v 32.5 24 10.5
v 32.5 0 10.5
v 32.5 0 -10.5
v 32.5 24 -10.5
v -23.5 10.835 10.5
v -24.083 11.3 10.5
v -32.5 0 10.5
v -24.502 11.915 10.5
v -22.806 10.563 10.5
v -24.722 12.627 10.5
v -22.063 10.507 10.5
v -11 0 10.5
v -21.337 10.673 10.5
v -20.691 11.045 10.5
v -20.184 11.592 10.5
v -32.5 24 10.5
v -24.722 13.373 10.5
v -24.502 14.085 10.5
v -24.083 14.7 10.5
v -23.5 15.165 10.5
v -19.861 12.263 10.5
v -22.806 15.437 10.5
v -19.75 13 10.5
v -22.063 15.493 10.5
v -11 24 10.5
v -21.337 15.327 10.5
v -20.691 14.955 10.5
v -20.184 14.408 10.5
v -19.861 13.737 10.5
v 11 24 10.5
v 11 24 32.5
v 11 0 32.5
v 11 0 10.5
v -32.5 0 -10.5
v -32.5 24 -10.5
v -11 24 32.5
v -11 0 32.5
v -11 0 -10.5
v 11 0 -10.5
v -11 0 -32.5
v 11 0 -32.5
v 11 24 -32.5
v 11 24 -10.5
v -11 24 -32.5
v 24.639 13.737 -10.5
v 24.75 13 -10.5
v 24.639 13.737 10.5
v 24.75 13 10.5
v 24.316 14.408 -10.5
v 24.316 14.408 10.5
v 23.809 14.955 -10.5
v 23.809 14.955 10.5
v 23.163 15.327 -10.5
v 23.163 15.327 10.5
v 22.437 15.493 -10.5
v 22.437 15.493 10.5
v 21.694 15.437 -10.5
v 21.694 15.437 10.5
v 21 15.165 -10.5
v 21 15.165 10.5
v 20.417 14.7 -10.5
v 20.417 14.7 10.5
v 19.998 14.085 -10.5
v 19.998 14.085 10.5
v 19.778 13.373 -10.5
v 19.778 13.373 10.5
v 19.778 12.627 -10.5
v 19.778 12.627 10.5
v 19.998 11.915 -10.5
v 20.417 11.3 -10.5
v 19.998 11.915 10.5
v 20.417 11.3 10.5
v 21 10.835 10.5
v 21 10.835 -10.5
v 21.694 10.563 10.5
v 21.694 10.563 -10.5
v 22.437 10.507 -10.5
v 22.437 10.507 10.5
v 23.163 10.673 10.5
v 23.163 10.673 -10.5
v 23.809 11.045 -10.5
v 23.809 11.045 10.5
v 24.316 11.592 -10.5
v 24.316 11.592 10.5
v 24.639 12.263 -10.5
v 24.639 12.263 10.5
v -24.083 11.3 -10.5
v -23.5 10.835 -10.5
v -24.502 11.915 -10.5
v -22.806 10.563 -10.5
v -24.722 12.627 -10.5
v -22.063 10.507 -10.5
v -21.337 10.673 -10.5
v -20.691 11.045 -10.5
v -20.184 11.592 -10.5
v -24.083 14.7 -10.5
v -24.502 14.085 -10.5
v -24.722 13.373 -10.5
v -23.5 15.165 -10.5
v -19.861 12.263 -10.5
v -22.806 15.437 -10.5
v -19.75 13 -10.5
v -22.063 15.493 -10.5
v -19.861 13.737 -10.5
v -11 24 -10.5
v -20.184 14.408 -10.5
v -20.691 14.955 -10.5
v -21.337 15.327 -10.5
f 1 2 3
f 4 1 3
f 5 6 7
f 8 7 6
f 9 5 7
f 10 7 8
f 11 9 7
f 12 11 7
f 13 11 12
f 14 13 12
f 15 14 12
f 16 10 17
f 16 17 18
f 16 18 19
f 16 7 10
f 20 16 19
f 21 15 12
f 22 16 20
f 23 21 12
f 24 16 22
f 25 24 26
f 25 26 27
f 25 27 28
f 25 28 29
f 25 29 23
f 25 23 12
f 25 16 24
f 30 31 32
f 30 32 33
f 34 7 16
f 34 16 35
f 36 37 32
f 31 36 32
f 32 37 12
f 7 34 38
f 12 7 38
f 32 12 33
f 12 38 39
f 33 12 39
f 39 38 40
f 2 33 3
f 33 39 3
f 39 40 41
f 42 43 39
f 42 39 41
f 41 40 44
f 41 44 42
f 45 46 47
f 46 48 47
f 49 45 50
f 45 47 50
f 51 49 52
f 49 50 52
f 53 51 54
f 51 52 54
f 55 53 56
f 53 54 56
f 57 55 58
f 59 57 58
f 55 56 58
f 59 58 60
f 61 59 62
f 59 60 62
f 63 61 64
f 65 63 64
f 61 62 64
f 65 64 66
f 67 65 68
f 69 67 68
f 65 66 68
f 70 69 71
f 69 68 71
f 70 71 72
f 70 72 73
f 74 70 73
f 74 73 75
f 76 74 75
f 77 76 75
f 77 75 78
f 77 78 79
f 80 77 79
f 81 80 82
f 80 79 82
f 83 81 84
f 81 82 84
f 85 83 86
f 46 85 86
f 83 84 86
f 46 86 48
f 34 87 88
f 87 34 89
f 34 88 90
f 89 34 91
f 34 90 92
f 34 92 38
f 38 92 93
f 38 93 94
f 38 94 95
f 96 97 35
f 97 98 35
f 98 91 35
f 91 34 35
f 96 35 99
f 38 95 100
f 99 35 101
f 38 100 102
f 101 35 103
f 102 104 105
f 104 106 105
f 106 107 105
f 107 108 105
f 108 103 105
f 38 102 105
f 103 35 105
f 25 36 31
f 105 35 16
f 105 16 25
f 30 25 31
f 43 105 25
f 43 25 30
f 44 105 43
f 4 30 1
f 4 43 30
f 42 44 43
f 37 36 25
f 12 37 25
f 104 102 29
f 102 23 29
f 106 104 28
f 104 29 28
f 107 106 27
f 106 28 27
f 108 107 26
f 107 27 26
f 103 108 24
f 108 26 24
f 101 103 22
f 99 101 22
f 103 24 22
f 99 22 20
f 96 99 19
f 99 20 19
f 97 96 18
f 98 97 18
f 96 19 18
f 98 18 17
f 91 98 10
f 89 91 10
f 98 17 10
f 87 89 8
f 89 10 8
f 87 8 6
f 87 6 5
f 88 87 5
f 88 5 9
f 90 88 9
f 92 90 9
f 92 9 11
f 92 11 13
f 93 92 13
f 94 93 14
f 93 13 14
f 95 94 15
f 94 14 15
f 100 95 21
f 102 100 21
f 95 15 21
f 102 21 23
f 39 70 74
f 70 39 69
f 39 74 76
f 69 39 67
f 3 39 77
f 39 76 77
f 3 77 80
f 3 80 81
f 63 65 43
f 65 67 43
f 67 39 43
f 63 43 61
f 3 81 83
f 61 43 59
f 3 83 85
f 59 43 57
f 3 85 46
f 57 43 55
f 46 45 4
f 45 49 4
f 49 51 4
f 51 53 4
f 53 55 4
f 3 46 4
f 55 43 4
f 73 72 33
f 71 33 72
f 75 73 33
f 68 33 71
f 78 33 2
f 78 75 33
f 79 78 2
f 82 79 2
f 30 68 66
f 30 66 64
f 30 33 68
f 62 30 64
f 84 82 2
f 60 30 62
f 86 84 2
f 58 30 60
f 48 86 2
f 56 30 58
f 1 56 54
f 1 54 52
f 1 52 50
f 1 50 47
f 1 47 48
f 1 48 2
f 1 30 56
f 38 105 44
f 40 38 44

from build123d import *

# Parameters (mm, degrees)
SKETCH1_W               = 65
SKETCH1_H               = 65
BOSS_EXTRUDE1_DEPTH     = 24
SKETCH3_W               = 21.5
SKETCH3_H               = 22
CUT_EXTRUDE2_DEPTH      = 25
SKETCH4_R               = 2.5
CUT_EXTRUDE3_DEPTH      = 33.5
CUT_EXTRUDE3_DEPTH_BACK = 33.5


with BuildPart() as part:
    # Sketch1 → Boss-Extrude1 (new body)
    with BuildSketch(Plane(origin=(0, 0, 0), x_dir=(1, 0, 0), z_dir=(0, 1, 0))):
        Rectangle(SKETCH1_W, SKETCH1_H)
    extrude(amount=BOSS_EXTRUDE1_DEPTH)

    # Sketch3 → Cut-Extrude2 (cut, through all)
    with BuildSketch(Plane(origin=(0, 24, 0), x_dir=(1, 0, 0), z_dir=(0, 1, 0))):
        with Locations((-21.75, 21.5)):
            Rectangle(SKETCH3_W, SKETCH3_H)
        with Locations((21.75, 21.5)):
            Rectangle(SKETCH3_W, SKETCH3_H)
        with Locations((21.75, -21.5)):
            Rectangle(SKETCH3_W, SKETCH3_H)
        with Locations((-21.75, -21.5)):
            Rectangle(SKETCH3_W, SKETCH3_H)
    extrude(amount=-CUT_EXTRUDE2_DEPTH, mode=Mode.SUBTRACT)

    # Sketch4 → Cut-Extrude3 (cut, two sides)
    with BuildSketch(Plane.XY) as cut_extrude3_sk:
        with Locations((-22.25, 13)):
            Circle(SKETCH4_R)
        with Locations((22.25, 13)):
            Circle(SKETCH4_R)
    extrude(amount=CUT_EXTRUDE3_DEPTH, mode=Mode.SUBTRACT)
    extrude(cut_extrude3_sk.sketch, amount=-CUT_EXTRUDE3_DEPTH_BACK, mode=Mode.SUBTRACT)


solid = part.part
